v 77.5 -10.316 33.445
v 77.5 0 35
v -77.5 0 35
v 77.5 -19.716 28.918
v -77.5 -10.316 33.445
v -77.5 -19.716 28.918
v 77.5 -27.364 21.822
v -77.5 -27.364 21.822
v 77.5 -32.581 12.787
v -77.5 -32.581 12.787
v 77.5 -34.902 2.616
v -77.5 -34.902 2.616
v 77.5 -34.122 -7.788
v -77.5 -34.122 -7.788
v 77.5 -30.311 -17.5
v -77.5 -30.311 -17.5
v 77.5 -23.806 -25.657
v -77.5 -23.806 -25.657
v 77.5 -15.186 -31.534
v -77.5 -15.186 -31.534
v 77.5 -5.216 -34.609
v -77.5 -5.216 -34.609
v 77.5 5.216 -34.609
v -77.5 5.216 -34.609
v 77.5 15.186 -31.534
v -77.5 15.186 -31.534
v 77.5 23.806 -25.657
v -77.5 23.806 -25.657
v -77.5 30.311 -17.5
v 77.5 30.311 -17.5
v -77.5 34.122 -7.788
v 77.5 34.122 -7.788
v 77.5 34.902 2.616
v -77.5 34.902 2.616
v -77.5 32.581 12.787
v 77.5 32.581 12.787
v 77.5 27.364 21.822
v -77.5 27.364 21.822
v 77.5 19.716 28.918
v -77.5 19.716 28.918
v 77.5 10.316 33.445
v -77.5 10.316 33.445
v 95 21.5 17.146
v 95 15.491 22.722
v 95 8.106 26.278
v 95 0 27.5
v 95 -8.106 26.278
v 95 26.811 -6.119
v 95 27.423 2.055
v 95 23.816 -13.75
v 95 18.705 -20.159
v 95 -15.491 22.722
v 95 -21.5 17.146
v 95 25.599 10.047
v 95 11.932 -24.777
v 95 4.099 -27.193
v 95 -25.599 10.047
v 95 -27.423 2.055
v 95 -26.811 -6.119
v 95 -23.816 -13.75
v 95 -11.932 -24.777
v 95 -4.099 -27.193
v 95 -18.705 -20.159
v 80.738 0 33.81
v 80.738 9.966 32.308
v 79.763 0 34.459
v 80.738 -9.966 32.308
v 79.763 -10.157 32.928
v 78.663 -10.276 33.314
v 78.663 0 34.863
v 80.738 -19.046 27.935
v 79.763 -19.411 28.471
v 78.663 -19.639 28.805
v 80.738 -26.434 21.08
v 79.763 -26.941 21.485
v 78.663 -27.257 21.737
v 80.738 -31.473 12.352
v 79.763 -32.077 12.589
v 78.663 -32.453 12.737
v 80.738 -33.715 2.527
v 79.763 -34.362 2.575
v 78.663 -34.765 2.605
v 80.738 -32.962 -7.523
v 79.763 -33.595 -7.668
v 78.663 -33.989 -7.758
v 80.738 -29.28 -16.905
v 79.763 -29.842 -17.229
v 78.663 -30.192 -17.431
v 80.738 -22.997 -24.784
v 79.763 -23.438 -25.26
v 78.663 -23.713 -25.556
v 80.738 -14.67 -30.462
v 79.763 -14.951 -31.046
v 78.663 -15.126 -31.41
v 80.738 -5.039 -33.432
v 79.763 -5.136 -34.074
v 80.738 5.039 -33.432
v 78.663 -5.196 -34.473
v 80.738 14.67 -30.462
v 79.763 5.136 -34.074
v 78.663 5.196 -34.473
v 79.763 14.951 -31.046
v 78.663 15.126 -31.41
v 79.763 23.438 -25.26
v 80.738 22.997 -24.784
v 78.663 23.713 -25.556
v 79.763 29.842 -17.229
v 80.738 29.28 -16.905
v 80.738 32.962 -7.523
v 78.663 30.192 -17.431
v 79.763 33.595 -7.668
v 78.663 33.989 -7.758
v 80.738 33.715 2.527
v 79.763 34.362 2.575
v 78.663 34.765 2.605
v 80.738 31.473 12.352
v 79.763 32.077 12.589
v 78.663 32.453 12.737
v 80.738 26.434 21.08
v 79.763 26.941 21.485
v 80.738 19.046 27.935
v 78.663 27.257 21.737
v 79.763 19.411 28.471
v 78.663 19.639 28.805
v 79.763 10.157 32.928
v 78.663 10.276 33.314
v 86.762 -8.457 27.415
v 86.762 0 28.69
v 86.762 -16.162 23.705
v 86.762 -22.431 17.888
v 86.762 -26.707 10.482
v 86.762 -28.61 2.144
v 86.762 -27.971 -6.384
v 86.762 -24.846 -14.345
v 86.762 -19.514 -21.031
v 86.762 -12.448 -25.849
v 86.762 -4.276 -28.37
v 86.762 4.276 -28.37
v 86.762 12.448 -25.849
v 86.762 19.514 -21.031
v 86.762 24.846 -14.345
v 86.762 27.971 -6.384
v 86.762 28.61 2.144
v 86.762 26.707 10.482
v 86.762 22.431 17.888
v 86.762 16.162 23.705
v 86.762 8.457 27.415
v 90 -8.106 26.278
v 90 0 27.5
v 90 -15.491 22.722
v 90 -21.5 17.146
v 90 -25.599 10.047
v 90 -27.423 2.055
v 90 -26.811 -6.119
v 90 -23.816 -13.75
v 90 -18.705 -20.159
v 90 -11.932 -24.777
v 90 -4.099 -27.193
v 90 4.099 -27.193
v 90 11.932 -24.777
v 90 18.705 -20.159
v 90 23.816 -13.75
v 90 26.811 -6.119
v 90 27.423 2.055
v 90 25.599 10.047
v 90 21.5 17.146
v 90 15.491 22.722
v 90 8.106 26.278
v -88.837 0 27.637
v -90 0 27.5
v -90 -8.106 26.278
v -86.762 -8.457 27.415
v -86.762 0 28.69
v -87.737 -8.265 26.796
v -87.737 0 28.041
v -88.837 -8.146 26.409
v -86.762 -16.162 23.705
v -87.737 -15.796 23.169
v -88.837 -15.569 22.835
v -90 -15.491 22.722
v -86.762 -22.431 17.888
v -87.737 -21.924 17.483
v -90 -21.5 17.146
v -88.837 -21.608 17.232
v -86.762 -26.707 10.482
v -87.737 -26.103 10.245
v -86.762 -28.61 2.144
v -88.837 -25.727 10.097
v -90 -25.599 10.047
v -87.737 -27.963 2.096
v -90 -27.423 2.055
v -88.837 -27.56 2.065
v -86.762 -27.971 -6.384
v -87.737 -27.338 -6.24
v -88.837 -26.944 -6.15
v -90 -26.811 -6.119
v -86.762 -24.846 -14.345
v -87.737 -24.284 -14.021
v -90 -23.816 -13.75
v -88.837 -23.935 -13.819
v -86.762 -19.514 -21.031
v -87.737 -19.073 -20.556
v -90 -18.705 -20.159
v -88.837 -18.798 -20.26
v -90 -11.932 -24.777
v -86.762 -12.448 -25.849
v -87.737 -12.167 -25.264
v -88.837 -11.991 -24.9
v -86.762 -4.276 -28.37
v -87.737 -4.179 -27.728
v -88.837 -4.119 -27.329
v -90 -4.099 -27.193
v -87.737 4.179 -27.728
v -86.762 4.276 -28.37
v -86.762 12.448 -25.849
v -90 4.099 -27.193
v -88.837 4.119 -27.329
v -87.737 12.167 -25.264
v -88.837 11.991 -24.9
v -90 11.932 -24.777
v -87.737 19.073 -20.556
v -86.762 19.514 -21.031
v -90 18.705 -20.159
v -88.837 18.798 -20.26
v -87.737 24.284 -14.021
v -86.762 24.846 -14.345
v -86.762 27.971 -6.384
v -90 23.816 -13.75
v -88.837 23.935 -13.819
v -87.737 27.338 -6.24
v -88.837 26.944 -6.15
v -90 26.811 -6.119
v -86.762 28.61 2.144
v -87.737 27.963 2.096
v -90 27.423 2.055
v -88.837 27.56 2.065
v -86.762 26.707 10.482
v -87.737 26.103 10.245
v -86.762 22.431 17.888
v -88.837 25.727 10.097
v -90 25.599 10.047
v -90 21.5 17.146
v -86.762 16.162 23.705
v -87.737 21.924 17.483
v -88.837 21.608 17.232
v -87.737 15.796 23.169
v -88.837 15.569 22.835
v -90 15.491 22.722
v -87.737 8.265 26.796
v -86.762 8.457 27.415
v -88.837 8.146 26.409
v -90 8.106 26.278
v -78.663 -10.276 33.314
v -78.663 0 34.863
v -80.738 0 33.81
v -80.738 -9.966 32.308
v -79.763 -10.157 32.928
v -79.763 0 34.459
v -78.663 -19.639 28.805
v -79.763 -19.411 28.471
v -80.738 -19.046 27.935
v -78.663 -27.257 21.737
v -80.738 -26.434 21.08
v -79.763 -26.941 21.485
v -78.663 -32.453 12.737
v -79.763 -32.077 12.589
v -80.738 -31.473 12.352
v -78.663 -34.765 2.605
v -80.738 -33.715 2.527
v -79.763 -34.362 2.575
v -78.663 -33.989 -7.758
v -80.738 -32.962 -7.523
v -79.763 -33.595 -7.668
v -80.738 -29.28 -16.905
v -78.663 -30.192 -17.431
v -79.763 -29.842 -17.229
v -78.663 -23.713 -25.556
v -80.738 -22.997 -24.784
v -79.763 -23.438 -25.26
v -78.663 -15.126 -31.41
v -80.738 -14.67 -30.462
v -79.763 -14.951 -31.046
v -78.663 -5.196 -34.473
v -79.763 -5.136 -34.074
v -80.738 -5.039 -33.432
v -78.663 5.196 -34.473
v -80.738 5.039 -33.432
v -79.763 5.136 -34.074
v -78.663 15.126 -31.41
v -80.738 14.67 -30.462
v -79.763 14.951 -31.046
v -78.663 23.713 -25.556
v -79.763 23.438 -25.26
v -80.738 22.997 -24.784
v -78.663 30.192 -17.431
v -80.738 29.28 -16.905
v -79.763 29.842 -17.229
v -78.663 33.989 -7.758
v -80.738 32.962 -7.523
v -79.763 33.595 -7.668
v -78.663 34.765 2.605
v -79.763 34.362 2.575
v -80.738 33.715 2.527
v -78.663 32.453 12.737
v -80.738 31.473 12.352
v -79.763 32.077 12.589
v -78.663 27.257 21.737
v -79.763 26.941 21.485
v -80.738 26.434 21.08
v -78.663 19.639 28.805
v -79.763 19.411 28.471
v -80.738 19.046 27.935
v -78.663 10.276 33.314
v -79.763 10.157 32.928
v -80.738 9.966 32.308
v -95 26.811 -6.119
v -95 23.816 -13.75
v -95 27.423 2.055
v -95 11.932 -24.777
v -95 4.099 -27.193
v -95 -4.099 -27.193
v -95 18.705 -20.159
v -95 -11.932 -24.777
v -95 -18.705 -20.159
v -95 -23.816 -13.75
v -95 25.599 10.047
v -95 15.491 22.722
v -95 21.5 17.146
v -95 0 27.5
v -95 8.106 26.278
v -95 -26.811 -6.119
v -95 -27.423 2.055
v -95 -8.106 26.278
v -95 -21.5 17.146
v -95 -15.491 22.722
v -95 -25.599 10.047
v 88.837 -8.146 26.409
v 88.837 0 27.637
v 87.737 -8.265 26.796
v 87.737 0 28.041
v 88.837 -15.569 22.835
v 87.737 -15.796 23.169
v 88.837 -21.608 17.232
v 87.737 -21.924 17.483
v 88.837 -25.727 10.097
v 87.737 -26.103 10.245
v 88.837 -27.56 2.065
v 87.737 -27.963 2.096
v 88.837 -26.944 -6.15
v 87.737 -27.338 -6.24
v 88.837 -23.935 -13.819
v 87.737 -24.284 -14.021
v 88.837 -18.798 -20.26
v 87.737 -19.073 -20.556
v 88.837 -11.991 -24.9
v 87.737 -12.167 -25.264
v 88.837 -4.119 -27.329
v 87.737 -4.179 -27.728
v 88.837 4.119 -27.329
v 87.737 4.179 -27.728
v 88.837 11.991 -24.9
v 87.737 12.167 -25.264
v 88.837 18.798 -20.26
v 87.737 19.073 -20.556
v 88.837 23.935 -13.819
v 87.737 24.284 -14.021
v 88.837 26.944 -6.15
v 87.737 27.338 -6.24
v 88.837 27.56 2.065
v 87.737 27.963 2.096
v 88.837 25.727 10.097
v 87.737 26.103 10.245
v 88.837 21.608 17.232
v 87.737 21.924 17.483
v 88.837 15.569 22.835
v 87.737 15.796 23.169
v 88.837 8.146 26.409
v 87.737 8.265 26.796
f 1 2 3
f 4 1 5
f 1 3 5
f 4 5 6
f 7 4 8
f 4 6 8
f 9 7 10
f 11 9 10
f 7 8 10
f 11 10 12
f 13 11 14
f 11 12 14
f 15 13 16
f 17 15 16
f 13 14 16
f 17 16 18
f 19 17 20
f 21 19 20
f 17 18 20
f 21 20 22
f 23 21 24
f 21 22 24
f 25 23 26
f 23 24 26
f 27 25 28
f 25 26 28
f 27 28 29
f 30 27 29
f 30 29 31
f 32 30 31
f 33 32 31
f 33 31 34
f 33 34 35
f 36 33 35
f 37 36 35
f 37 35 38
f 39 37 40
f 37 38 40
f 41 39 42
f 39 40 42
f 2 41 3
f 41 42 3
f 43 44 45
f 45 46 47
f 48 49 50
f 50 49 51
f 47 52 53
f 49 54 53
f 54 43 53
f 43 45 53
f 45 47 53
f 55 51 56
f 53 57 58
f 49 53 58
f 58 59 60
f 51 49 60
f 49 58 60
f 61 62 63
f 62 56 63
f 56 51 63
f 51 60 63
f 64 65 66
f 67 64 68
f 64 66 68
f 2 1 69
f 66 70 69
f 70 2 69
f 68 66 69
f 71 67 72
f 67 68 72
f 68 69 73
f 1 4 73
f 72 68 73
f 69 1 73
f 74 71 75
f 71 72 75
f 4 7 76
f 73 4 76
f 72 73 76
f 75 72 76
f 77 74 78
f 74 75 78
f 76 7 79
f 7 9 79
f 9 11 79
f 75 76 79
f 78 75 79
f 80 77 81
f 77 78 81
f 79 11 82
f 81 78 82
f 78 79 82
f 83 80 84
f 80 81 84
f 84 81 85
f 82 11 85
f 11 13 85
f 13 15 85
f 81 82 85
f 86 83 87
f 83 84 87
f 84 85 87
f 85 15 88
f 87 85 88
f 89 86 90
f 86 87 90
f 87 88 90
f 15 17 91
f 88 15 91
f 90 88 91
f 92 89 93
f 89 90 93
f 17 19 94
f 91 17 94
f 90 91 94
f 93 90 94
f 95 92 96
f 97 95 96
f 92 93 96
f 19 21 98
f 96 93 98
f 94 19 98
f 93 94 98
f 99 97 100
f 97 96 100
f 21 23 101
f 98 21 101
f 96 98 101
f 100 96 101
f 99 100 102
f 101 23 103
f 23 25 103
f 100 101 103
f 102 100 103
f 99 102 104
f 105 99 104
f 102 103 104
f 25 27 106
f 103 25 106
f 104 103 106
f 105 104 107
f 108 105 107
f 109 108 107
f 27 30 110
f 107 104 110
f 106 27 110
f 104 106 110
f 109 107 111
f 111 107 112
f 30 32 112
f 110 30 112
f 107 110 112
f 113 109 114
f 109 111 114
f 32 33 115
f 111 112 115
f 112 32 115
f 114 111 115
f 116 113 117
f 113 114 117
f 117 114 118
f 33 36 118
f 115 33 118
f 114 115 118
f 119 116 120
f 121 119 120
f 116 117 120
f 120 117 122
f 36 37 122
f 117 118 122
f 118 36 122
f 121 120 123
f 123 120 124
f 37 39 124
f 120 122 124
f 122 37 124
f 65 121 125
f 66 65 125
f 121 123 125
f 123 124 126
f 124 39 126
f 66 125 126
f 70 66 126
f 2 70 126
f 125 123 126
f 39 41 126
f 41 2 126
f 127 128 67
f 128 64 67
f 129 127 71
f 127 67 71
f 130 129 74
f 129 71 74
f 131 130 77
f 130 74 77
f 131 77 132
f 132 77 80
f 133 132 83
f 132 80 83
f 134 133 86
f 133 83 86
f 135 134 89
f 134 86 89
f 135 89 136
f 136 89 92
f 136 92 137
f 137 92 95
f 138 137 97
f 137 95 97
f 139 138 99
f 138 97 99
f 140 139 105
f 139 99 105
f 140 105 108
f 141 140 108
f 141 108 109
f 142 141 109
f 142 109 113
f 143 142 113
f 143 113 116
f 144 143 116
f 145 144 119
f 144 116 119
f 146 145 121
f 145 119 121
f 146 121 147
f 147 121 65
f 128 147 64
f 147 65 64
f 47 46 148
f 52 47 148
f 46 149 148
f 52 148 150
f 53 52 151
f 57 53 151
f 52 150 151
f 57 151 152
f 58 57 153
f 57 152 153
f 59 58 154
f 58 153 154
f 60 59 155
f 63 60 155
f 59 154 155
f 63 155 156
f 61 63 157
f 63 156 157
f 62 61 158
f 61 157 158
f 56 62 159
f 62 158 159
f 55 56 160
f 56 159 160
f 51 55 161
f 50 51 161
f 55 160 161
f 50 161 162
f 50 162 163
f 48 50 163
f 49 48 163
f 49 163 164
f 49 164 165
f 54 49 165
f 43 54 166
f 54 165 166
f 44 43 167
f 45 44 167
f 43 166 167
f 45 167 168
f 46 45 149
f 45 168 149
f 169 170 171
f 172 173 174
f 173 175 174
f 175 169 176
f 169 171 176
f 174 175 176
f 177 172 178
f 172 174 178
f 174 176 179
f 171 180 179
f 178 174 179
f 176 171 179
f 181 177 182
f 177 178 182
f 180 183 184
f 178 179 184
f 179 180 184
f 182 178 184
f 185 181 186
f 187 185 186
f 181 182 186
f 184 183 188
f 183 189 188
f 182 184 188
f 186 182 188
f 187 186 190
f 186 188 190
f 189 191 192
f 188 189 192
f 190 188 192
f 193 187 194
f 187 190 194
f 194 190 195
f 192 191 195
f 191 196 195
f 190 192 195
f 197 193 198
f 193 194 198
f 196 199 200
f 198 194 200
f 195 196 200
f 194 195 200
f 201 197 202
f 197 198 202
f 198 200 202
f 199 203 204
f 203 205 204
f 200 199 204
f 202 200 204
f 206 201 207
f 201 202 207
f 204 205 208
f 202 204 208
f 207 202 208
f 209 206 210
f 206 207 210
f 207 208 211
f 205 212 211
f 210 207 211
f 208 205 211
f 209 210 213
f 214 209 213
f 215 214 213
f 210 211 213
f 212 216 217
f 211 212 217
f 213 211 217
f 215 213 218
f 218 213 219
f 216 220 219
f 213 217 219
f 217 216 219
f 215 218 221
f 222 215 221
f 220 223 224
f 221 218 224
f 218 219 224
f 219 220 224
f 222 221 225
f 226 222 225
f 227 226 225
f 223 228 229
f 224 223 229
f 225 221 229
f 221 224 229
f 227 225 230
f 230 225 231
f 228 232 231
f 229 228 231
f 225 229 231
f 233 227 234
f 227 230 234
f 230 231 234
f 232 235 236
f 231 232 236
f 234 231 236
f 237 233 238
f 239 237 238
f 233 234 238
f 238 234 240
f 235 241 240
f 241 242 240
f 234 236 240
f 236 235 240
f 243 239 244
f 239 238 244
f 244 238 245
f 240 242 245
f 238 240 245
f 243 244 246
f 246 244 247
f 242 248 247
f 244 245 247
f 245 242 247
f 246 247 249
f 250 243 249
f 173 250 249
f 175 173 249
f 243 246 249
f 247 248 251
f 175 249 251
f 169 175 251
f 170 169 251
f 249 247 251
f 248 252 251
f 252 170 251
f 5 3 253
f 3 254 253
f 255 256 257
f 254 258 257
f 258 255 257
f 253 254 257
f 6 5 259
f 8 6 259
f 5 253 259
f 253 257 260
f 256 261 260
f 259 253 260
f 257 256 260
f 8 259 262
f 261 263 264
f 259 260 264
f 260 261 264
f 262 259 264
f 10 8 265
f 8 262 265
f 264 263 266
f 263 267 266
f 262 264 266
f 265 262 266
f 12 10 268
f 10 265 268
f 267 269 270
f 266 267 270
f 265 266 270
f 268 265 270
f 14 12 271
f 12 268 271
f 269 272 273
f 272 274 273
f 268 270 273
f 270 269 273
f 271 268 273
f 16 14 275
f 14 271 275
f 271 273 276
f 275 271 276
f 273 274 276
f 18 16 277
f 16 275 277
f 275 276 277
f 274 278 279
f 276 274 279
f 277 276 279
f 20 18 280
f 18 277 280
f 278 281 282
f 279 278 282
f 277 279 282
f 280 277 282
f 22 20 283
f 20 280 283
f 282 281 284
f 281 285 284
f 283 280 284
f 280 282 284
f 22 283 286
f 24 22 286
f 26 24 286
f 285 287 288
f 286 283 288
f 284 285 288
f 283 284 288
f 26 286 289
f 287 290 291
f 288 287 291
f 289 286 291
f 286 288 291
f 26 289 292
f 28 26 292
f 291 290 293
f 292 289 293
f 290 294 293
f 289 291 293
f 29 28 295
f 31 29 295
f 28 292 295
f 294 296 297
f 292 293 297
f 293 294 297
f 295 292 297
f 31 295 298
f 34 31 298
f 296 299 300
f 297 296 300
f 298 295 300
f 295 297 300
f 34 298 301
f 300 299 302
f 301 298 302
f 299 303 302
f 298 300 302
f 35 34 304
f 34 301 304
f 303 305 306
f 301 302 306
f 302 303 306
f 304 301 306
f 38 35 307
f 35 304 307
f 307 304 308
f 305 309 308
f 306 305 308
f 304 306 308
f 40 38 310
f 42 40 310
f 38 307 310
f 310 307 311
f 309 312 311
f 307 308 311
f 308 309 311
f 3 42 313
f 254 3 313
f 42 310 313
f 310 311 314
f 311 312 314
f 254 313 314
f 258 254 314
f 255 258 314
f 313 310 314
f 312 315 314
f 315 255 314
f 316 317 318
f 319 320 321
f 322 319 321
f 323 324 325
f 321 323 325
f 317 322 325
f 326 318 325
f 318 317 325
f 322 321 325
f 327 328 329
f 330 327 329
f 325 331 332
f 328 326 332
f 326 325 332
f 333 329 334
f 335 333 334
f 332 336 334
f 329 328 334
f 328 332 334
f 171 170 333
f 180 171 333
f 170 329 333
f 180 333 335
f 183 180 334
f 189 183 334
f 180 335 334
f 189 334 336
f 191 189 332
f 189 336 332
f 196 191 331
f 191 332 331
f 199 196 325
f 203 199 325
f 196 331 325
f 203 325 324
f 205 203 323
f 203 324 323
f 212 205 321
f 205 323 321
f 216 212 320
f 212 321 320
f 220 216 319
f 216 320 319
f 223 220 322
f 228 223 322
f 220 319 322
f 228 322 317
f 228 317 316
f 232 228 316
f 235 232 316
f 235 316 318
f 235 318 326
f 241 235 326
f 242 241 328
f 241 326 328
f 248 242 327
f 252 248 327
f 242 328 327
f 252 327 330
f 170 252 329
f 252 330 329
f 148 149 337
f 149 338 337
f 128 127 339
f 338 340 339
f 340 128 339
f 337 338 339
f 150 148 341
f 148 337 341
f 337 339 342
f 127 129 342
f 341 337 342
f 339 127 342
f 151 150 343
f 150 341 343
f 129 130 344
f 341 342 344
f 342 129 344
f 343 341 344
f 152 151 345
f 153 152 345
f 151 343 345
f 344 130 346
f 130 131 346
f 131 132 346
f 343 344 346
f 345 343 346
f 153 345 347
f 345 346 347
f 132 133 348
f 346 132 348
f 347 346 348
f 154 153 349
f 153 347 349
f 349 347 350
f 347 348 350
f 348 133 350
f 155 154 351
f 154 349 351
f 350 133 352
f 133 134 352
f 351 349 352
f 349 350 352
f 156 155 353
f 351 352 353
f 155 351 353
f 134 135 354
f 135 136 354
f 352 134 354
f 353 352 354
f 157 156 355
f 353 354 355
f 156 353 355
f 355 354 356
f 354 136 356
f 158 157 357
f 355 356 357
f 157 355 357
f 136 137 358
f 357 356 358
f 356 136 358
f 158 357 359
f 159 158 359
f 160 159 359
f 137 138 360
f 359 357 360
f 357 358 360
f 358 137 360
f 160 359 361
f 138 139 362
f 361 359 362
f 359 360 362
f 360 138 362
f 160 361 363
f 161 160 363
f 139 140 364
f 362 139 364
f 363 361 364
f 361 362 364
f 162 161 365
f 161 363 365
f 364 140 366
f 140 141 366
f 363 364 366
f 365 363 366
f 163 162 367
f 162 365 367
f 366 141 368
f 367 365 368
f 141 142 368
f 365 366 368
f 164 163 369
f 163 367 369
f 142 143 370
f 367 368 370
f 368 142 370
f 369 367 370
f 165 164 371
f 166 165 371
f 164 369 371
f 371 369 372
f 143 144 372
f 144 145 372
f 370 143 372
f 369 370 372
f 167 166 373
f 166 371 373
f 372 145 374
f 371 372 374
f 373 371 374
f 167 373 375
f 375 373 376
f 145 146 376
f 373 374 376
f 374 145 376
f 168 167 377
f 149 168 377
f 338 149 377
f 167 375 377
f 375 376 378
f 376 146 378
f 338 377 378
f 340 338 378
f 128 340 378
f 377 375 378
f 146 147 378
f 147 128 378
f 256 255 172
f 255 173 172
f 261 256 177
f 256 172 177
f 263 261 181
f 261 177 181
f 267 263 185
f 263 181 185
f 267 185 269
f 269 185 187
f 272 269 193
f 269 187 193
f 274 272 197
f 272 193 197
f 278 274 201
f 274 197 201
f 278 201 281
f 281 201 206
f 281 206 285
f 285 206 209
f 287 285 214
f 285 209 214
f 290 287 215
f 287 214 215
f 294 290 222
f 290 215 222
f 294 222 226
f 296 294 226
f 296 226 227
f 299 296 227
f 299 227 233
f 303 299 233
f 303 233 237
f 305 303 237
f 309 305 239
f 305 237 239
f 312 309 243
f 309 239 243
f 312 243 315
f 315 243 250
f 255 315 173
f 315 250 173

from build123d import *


with BuildPart() as part:
    # Sketch1 → Revolve1 (revolve)
    with BuildSketch(Plane(origin=(0, 0, 0), x_dir=(1, 0, 0), z_dir=(0, 1, 0))):
        with BuildLine():
            Line((95, 0), (95, 27.5))
            Line((95, 27.5), (90, 27.5))
            ThreePointArc((90, 27.5), (88.27509592, 27.80695132), (86.761976473, 28.690117634))
            Line((86.761976473, 28.690117634), (80.738023527, 33.809882366))
            ThreePointArc((80.738023527, 33.809882366), (79.22490408, 34.69304868), (77.5, 35))
            Line((77.5, 35), (-77.5, 35))
            ThreePointArc((-77.5, 35), (-79.22490408, 34.69304868), (-80.738023527, 33.809882366))
            Line((-80.738023527, 33.809882366), (-86.761976473, 28.690117634))
            ThreePointArc((-86.761976473, 28.690117634), (-88.27509592, 27.80695132), (-90, 27.5))
            Line((-90, 27.5), (-95, 27.5))
            Line((-95, 27.5), (-95, 0))
            Line((-95, 0), (95, 0))
        make_face()
    revolve(axis=Axis((-95, 0, 0), (1, 0, 0)))


solid = part.part
